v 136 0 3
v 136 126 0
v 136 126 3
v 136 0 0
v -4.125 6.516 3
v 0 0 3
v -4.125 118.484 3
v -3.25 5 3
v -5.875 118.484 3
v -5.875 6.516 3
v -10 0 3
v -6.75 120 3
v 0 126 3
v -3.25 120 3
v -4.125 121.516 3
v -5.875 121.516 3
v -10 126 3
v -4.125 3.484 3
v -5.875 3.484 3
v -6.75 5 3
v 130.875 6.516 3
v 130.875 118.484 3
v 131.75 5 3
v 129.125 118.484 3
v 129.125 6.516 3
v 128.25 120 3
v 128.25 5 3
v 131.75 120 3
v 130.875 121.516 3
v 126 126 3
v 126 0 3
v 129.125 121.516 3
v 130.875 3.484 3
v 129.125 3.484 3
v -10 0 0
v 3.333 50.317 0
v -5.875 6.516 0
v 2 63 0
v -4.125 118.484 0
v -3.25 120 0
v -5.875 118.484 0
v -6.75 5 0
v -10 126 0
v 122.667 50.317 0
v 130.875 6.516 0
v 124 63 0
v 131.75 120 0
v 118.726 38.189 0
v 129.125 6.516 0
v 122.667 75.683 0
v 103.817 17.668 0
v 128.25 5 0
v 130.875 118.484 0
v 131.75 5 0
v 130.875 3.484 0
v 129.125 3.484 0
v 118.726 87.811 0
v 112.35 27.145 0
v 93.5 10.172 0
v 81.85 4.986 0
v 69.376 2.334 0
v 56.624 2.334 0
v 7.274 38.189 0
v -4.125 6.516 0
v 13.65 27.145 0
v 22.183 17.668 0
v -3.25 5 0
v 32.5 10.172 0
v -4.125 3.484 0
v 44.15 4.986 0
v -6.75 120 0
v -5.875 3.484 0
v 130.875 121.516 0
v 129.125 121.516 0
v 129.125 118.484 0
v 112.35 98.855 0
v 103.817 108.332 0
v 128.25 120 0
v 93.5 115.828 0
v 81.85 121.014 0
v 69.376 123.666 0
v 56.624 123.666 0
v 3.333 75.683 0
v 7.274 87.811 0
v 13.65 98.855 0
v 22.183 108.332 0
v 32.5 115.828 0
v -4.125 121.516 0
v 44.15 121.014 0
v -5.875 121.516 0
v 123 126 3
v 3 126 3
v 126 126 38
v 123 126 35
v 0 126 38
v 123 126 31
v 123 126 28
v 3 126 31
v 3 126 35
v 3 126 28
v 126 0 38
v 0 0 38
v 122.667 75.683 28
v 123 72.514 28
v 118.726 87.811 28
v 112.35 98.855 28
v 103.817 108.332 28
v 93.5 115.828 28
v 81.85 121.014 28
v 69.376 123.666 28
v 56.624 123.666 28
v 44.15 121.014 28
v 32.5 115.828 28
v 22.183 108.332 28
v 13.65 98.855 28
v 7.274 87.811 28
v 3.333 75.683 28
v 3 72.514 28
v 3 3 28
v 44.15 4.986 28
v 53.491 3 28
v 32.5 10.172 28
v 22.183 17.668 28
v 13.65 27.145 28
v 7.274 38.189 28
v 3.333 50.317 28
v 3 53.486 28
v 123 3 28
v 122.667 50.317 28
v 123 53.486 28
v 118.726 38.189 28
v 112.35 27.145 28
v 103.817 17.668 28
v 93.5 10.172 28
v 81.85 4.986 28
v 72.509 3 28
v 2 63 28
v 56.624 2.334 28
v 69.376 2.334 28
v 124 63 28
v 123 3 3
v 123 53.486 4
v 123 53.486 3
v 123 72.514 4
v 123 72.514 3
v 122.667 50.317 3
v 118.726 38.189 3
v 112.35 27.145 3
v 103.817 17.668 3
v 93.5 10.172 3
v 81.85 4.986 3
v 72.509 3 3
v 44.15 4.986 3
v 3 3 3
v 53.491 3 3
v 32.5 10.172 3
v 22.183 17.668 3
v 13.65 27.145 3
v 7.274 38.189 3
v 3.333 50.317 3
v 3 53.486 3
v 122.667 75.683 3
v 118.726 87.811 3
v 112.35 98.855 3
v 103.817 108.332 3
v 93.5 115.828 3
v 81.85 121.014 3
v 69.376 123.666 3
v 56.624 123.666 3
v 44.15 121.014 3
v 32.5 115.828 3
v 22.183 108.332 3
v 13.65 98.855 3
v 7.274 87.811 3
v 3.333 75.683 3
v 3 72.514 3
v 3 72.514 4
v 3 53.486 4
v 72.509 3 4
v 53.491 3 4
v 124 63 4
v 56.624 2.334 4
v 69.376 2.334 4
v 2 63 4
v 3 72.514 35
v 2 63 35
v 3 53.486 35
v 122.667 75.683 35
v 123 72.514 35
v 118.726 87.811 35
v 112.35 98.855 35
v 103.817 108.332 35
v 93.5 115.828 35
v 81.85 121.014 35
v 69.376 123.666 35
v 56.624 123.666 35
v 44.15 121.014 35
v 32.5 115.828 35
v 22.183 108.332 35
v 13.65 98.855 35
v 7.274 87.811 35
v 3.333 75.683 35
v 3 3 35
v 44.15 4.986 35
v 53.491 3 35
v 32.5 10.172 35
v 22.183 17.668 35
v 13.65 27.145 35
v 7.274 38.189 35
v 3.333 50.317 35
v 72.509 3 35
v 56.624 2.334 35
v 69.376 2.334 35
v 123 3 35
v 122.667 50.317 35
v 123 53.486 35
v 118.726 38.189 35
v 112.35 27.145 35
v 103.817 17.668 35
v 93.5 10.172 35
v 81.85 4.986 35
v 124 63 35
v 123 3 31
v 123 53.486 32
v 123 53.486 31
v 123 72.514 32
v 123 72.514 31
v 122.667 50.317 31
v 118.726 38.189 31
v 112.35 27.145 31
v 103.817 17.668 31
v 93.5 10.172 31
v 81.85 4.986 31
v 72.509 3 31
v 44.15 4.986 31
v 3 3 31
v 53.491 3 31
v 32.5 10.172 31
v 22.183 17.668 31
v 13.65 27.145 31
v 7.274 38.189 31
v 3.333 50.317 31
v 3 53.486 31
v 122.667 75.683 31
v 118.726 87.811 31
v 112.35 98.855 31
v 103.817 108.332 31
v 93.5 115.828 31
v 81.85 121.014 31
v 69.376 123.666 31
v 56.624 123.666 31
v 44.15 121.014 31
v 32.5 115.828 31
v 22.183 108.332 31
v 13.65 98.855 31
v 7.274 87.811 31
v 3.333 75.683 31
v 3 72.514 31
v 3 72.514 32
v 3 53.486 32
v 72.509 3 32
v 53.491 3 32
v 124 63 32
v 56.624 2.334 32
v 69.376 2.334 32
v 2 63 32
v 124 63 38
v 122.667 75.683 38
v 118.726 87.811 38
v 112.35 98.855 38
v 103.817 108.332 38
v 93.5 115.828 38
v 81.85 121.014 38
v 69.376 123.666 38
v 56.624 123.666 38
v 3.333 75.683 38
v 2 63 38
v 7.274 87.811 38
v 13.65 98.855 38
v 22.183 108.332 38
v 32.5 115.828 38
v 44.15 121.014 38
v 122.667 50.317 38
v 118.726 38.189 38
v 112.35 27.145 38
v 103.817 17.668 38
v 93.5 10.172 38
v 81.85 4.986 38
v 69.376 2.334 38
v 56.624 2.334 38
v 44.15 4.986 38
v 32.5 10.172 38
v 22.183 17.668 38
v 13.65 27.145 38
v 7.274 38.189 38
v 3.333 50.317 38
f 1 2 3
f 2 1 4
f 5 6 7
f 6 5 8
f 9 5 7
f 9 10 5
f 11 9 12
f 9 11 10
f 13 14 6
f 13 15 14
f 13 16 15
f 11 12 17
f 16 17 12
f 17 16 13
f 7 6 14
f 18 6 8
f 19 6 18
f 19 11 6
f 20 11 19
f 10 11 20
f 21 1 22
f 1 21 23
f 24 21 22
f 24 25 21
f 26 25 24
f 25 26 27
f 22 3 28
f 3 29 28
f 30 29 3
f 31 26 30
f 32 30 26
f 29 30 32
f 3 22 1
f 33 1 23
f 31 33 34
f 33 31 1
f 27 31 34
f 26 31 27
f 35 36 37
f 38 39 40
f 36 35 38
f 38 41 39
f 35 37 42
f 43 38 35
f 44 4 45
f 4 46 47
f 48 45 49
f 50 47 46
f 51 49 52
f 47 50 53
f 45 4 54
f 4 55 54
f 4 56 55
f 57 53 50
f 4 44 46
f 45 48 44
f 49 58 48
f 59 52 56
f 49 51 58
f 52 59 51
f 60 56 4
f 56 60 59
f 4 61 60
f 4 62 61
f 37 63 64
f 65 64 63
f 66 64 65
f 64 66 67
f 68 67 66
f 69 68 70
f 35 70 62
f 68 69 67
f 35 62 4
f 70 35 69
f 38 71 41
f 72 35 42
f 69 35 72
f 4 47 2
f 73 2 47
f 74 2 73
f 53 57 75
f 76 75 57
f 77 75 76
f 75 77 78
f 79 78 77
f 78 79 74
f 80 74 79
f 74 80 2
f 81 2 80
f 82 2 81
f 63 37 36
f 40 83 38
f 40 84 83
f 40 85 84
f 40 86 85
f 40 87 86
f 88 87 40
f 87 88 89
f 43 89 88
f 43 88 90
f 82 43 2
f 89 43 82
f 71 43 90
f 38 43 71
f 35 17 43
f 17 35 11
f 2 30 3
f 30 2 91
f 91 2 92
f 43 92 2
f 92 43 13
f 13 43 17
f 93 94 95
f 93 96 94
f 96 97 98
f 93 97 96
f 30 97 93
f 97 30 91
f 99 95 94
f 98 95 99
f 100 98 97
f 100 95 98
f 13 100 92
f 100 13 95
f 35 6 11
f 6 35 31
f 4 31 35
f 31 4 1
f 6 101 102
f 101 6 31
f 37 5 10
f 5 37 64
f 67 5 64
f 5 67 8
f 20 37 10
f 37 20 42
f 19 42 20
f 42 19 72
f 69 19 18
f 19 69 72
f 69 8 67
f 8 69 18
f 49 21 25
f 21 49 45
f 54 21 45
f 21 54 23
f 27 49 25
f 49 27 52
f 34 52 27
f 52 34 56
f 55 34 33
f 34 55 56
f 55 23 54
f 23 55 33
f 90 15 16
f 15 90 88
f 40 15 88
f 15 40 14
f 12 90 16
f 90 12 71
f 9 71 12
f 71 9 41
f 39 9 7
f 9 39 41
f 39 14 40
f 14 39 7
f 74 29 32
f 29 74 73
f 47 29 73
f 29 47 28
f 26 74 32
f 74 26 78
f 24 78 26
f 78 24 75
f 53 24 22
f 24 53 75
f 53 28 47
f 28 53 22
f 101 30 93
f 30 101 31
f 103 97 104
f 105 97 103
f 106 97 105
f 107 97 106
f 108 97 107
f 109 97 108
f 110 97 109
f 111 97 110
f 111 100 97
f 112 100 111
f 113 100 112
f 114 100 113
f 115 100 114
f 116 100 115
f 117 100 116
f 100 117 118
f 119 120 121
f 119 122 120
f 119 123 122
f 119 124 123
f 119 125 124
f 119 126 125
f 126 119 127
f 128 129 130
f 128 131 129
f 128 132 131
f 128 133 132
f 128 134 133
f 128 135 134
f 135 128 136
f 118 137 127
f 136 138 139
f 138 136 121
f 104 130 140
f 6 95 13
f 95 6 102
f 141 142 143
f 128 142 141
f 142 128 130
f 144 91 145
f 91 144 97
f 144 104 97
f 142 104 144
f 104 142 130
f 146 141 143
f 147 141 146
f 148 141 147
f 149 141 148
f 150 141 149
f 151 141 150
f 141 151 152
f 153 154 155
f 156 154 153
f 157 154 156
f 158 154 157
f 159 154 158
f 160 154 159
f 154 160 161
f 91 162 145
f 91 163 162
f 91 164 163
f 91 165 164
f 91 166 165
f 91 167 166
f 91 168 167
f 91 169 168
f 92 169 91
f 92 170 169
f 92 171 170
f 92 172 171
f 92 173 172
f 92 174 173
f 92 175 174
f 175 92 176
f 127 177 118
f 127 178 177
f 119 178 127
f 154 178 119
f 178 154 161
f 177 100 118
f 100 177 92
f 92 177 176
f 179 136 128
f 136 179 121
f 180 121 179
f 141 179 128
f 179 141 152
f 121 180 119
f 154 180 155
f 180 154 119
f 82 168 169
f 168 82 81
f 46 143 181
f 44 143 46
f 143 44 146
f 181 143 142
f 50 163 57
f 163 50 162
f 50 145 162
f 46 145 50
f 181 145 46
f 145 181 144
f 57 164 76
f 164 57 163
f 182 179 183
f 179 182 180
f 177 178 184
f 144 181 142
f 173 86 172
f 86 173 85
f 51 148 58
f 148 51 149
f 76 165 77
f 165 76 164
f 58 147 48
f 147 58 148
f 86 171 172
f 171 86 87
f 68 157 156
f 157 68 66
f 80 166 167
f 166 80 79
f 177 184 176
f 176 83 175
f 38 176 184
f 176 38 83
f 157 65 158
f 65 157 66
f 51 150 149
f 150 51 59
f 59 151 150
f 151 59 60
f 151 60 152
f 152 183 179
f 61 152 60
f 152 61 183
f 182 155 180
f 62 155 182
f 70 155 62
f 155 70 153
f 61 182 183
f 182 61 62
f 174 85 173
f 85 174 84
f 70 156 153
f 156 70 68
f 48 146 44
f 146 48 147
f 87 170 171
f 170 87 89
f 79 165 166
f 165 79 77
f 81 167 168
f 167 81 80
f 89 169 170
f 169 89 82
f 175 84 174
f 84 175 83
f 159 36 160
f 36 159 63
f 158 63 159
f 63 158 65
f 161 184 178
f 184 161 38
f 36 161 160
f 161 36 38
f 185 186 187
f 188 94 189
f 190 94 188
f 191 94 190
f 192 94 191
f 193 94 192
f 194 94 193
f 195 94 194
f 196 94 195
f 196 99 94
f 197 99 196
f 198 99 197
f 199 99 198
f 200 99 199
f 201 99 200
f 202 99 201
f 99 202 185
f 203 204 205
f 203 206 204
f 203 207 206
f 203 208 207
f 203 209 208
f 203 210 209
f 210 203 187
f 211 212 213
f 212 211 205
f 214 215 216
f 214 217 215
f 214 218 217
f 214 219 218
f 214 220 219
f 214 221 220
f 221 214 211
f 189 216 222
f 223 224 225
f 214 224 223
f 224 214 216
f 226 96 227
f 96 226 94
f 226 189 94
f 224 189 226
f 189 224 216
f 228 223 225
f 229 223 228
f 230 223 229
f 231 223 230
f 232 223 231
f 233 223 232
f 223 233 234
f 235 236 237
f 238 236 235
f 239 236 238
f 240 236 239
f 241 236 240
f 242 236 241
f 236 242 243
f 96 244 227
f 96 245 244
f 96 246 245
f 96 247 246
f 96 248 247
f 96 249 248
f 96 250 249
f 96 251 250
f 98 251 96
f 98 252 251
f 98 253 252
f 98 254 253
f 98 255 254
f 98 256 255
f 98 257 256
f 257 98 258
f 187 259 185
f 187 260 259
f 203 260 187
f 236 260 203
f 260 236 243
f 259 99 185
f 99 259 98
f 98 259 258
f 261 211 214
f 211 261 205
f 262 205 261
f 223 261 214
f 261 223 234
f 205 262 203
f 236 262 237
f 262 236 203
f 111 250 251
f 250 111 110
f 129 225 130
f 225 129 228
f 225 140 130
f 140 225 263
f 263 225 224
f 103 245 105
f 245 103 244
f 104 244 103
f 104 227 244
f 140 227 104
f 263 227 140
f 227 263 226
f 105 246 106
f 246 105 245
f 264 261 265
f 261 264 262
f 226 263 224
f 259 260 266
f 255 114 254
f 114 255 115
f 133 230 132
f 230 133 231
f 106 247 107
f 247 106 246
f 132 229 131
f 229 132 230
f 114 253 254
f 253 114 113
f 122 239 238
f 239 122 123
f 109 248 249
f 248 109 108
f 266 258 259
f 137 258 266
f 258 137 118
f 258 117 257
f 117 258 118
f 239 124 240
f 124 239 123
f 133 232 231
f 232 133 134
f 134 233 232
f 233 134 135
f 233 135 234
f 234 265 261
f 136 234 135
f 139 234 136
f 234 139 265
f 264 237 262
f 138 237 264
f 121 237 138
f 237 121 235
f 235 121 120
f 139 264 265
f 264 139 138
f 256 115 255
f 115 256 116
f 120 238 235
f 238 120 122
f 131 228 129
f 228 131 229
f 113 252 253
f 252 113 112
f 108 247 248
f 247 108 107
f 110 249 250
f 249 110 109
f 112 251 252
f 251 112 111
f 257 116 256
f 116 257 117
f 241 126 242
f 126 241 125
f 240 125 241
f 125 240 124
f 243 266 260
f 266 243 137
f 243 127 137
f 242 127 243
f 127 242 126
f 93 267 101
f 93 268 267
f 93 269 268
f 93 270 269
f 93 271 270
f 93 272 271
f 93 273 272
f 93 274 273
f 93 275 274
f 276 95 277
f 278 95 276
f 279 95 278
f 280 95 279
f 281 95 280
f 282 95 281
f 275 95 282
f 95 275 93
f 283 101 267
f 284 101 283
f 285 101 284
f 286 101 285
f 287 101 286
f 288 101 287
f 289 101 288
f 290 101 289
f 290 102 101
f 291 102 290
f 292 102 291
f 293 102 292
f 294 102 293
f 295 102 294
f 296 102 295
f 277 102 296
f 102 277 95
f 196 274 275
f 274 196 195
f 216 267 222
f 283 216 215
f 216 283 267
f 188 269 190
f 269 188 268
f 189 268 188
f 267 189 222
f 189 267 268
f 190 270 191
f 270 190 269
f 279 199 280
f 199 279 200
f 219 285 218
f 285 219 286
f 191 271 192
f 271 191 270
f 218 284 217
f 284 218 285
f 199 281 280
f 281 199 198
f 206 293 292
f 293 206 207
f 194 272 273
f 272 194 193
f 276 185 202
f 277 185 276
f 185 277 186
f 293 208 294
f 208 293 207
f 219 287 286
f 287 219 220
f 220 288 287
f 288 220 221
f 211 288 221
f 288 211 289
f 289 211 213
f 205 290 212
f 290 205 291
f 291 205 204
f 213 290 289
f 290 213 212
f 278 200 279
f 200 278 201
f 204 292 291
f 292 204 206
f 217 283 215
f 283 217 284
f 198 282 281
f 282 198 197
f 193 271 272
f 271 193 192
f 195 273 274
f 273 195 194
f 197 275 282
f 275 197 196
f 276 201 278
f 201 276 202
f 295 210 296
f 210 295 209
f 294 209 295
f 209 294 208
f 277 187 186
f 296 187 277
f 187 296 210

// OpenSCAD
/* [Render] */
// Select what to render
render_choice = "fanbracket"; // [fanbracket:Fan bracket, frontbracket:Front bracket]

/* [Model dimensions] */
// Fan diameter in mm
fan_diameter = 120; // 0.1
// Fan width in mm
fan_width = 25; // 0.1
// Wall thickness in mm
wall_thickness = 3; // 0.1
// Filter width in mm
filter_width = 4; // 0.1

/* [Model detail] */
// Number of fragments, 0 means default
fn = 0; // 1

$fn = fn;

if (render_choice == "fanbracket") {
    fan_bracket();
} else if (render_choice == "frontbracket") {
    front_bracket();
} else {
    echo("Error: Invalid render choice");
}

module fan_bracket() {
    // Fan bracket
    difference() {
        union() {
            cube([fan_diameter + 2*wall_thickness, fan_diameter + 2*wall_thickness, fan_width + wall_thickness]);
            // Bracket base
            translate([-10, 0, 0]) difference() {
                cube([fan_diameter + 2*wall_thickness + 20, fan_diameter + 2*wall_thickness, wall_thickness]);
                // Mounting holes
                translate([5, 5, -1])
                cylinder(h = wall_thickness + 2, d=3.5);
                translate([20 + fan_diameter, 5, -1])
                cylinder(h = wall_thickness + 2, d=3.5);
                translate([5, fan_diameter, -1])
                cylinder(h = wall_thickness + 2, d=3.5);
                translate([20 + fan_diameter, fan_diameter, -1])
                cylinder(h = wall_thickness + 2, d=3.5);
            }
        }
        translate([wall_thickness, wall_thickness, wall_thickness])
        cube([fan_diameter, fan_diameter + 2*wall_thickness + 1, fan_width + 1]);
        translate([fan_diameter/2 + wall_thickness, fan_diameter/2 + wall_thickness, -1])
        cylinder(h=wall_thickness + 2, d=fan_diameter + 2);
    }

    // Filter bracket
    translate([0, 0, wall_thickness + fan_width])
    difference() {
        cube([fan_diameter + 2*wall_thickness, fan_diameter + 2*wall_thickness, filter_width + wall_thickness]);
        translate([wall_thickness, wall_thickness, wall_thickness])
        cube([fan_diameter, fan_diameter + 2*wall_thickness + 1, filter_width + wall_thickness]);
        translate([fan_diameter/2 + wall_thickness, fan_diameter/2 + wall_thickness, -1])
        cylinder(h=wall_thickness + 2, d=fan_diameter + 2);
    }

    // Filter back
    translate([0, 0, 2*wall_thickness + fan_width + filter_width])
    difference() {
        cube([fan_diameter + 2*wall_thickness, fan_diameter + 2*wall_thickness, wall_thickness]);
        translate([fan_diameter/2 + wall_thickness, fan_diameter/2 + wall_thickness, -1])
        cylinder(h=wall_thickness + 2, d=fan_diameter + 2);
    }
}

module front_bracket() {
    difference() {
        union() {
            cube([fan_diameter + 2*wall_thickness, fan_diameter + 2*wall_thickness, wall_thickness]);
            // Bracket base
            translate([-10, 0, 0]) difference() {
                cube([fan_diameter + 2*wall_thickness + 20, fan_diameter + 2*wall_thickness, wall_thickness]);
                // Mounting holes
                translate([5, 5, -1])
                cylinder(h = wall_thickness + 2, d=3.5);
                translate([20 + fan_diameter, 5, -1])
                cylinder(h = wall_thickness + 2, d=3.5);
                translate([5, fan_diameter, -1])
                cylinder(h = wall_thickness + 2, d=3.5);
                translate([20 + fan_diameter, fan_diameter, -1])
                cylinder(h = wall_thickness + 2, d=3.5);
            }
        }
        translate([fan_diameter/2 + wall_thickness, fan_diameter/2 + wall_thickness, -1])
        cylinder(h=wall_thickness + 2, d=fan_diameter + 2);
    }
}
